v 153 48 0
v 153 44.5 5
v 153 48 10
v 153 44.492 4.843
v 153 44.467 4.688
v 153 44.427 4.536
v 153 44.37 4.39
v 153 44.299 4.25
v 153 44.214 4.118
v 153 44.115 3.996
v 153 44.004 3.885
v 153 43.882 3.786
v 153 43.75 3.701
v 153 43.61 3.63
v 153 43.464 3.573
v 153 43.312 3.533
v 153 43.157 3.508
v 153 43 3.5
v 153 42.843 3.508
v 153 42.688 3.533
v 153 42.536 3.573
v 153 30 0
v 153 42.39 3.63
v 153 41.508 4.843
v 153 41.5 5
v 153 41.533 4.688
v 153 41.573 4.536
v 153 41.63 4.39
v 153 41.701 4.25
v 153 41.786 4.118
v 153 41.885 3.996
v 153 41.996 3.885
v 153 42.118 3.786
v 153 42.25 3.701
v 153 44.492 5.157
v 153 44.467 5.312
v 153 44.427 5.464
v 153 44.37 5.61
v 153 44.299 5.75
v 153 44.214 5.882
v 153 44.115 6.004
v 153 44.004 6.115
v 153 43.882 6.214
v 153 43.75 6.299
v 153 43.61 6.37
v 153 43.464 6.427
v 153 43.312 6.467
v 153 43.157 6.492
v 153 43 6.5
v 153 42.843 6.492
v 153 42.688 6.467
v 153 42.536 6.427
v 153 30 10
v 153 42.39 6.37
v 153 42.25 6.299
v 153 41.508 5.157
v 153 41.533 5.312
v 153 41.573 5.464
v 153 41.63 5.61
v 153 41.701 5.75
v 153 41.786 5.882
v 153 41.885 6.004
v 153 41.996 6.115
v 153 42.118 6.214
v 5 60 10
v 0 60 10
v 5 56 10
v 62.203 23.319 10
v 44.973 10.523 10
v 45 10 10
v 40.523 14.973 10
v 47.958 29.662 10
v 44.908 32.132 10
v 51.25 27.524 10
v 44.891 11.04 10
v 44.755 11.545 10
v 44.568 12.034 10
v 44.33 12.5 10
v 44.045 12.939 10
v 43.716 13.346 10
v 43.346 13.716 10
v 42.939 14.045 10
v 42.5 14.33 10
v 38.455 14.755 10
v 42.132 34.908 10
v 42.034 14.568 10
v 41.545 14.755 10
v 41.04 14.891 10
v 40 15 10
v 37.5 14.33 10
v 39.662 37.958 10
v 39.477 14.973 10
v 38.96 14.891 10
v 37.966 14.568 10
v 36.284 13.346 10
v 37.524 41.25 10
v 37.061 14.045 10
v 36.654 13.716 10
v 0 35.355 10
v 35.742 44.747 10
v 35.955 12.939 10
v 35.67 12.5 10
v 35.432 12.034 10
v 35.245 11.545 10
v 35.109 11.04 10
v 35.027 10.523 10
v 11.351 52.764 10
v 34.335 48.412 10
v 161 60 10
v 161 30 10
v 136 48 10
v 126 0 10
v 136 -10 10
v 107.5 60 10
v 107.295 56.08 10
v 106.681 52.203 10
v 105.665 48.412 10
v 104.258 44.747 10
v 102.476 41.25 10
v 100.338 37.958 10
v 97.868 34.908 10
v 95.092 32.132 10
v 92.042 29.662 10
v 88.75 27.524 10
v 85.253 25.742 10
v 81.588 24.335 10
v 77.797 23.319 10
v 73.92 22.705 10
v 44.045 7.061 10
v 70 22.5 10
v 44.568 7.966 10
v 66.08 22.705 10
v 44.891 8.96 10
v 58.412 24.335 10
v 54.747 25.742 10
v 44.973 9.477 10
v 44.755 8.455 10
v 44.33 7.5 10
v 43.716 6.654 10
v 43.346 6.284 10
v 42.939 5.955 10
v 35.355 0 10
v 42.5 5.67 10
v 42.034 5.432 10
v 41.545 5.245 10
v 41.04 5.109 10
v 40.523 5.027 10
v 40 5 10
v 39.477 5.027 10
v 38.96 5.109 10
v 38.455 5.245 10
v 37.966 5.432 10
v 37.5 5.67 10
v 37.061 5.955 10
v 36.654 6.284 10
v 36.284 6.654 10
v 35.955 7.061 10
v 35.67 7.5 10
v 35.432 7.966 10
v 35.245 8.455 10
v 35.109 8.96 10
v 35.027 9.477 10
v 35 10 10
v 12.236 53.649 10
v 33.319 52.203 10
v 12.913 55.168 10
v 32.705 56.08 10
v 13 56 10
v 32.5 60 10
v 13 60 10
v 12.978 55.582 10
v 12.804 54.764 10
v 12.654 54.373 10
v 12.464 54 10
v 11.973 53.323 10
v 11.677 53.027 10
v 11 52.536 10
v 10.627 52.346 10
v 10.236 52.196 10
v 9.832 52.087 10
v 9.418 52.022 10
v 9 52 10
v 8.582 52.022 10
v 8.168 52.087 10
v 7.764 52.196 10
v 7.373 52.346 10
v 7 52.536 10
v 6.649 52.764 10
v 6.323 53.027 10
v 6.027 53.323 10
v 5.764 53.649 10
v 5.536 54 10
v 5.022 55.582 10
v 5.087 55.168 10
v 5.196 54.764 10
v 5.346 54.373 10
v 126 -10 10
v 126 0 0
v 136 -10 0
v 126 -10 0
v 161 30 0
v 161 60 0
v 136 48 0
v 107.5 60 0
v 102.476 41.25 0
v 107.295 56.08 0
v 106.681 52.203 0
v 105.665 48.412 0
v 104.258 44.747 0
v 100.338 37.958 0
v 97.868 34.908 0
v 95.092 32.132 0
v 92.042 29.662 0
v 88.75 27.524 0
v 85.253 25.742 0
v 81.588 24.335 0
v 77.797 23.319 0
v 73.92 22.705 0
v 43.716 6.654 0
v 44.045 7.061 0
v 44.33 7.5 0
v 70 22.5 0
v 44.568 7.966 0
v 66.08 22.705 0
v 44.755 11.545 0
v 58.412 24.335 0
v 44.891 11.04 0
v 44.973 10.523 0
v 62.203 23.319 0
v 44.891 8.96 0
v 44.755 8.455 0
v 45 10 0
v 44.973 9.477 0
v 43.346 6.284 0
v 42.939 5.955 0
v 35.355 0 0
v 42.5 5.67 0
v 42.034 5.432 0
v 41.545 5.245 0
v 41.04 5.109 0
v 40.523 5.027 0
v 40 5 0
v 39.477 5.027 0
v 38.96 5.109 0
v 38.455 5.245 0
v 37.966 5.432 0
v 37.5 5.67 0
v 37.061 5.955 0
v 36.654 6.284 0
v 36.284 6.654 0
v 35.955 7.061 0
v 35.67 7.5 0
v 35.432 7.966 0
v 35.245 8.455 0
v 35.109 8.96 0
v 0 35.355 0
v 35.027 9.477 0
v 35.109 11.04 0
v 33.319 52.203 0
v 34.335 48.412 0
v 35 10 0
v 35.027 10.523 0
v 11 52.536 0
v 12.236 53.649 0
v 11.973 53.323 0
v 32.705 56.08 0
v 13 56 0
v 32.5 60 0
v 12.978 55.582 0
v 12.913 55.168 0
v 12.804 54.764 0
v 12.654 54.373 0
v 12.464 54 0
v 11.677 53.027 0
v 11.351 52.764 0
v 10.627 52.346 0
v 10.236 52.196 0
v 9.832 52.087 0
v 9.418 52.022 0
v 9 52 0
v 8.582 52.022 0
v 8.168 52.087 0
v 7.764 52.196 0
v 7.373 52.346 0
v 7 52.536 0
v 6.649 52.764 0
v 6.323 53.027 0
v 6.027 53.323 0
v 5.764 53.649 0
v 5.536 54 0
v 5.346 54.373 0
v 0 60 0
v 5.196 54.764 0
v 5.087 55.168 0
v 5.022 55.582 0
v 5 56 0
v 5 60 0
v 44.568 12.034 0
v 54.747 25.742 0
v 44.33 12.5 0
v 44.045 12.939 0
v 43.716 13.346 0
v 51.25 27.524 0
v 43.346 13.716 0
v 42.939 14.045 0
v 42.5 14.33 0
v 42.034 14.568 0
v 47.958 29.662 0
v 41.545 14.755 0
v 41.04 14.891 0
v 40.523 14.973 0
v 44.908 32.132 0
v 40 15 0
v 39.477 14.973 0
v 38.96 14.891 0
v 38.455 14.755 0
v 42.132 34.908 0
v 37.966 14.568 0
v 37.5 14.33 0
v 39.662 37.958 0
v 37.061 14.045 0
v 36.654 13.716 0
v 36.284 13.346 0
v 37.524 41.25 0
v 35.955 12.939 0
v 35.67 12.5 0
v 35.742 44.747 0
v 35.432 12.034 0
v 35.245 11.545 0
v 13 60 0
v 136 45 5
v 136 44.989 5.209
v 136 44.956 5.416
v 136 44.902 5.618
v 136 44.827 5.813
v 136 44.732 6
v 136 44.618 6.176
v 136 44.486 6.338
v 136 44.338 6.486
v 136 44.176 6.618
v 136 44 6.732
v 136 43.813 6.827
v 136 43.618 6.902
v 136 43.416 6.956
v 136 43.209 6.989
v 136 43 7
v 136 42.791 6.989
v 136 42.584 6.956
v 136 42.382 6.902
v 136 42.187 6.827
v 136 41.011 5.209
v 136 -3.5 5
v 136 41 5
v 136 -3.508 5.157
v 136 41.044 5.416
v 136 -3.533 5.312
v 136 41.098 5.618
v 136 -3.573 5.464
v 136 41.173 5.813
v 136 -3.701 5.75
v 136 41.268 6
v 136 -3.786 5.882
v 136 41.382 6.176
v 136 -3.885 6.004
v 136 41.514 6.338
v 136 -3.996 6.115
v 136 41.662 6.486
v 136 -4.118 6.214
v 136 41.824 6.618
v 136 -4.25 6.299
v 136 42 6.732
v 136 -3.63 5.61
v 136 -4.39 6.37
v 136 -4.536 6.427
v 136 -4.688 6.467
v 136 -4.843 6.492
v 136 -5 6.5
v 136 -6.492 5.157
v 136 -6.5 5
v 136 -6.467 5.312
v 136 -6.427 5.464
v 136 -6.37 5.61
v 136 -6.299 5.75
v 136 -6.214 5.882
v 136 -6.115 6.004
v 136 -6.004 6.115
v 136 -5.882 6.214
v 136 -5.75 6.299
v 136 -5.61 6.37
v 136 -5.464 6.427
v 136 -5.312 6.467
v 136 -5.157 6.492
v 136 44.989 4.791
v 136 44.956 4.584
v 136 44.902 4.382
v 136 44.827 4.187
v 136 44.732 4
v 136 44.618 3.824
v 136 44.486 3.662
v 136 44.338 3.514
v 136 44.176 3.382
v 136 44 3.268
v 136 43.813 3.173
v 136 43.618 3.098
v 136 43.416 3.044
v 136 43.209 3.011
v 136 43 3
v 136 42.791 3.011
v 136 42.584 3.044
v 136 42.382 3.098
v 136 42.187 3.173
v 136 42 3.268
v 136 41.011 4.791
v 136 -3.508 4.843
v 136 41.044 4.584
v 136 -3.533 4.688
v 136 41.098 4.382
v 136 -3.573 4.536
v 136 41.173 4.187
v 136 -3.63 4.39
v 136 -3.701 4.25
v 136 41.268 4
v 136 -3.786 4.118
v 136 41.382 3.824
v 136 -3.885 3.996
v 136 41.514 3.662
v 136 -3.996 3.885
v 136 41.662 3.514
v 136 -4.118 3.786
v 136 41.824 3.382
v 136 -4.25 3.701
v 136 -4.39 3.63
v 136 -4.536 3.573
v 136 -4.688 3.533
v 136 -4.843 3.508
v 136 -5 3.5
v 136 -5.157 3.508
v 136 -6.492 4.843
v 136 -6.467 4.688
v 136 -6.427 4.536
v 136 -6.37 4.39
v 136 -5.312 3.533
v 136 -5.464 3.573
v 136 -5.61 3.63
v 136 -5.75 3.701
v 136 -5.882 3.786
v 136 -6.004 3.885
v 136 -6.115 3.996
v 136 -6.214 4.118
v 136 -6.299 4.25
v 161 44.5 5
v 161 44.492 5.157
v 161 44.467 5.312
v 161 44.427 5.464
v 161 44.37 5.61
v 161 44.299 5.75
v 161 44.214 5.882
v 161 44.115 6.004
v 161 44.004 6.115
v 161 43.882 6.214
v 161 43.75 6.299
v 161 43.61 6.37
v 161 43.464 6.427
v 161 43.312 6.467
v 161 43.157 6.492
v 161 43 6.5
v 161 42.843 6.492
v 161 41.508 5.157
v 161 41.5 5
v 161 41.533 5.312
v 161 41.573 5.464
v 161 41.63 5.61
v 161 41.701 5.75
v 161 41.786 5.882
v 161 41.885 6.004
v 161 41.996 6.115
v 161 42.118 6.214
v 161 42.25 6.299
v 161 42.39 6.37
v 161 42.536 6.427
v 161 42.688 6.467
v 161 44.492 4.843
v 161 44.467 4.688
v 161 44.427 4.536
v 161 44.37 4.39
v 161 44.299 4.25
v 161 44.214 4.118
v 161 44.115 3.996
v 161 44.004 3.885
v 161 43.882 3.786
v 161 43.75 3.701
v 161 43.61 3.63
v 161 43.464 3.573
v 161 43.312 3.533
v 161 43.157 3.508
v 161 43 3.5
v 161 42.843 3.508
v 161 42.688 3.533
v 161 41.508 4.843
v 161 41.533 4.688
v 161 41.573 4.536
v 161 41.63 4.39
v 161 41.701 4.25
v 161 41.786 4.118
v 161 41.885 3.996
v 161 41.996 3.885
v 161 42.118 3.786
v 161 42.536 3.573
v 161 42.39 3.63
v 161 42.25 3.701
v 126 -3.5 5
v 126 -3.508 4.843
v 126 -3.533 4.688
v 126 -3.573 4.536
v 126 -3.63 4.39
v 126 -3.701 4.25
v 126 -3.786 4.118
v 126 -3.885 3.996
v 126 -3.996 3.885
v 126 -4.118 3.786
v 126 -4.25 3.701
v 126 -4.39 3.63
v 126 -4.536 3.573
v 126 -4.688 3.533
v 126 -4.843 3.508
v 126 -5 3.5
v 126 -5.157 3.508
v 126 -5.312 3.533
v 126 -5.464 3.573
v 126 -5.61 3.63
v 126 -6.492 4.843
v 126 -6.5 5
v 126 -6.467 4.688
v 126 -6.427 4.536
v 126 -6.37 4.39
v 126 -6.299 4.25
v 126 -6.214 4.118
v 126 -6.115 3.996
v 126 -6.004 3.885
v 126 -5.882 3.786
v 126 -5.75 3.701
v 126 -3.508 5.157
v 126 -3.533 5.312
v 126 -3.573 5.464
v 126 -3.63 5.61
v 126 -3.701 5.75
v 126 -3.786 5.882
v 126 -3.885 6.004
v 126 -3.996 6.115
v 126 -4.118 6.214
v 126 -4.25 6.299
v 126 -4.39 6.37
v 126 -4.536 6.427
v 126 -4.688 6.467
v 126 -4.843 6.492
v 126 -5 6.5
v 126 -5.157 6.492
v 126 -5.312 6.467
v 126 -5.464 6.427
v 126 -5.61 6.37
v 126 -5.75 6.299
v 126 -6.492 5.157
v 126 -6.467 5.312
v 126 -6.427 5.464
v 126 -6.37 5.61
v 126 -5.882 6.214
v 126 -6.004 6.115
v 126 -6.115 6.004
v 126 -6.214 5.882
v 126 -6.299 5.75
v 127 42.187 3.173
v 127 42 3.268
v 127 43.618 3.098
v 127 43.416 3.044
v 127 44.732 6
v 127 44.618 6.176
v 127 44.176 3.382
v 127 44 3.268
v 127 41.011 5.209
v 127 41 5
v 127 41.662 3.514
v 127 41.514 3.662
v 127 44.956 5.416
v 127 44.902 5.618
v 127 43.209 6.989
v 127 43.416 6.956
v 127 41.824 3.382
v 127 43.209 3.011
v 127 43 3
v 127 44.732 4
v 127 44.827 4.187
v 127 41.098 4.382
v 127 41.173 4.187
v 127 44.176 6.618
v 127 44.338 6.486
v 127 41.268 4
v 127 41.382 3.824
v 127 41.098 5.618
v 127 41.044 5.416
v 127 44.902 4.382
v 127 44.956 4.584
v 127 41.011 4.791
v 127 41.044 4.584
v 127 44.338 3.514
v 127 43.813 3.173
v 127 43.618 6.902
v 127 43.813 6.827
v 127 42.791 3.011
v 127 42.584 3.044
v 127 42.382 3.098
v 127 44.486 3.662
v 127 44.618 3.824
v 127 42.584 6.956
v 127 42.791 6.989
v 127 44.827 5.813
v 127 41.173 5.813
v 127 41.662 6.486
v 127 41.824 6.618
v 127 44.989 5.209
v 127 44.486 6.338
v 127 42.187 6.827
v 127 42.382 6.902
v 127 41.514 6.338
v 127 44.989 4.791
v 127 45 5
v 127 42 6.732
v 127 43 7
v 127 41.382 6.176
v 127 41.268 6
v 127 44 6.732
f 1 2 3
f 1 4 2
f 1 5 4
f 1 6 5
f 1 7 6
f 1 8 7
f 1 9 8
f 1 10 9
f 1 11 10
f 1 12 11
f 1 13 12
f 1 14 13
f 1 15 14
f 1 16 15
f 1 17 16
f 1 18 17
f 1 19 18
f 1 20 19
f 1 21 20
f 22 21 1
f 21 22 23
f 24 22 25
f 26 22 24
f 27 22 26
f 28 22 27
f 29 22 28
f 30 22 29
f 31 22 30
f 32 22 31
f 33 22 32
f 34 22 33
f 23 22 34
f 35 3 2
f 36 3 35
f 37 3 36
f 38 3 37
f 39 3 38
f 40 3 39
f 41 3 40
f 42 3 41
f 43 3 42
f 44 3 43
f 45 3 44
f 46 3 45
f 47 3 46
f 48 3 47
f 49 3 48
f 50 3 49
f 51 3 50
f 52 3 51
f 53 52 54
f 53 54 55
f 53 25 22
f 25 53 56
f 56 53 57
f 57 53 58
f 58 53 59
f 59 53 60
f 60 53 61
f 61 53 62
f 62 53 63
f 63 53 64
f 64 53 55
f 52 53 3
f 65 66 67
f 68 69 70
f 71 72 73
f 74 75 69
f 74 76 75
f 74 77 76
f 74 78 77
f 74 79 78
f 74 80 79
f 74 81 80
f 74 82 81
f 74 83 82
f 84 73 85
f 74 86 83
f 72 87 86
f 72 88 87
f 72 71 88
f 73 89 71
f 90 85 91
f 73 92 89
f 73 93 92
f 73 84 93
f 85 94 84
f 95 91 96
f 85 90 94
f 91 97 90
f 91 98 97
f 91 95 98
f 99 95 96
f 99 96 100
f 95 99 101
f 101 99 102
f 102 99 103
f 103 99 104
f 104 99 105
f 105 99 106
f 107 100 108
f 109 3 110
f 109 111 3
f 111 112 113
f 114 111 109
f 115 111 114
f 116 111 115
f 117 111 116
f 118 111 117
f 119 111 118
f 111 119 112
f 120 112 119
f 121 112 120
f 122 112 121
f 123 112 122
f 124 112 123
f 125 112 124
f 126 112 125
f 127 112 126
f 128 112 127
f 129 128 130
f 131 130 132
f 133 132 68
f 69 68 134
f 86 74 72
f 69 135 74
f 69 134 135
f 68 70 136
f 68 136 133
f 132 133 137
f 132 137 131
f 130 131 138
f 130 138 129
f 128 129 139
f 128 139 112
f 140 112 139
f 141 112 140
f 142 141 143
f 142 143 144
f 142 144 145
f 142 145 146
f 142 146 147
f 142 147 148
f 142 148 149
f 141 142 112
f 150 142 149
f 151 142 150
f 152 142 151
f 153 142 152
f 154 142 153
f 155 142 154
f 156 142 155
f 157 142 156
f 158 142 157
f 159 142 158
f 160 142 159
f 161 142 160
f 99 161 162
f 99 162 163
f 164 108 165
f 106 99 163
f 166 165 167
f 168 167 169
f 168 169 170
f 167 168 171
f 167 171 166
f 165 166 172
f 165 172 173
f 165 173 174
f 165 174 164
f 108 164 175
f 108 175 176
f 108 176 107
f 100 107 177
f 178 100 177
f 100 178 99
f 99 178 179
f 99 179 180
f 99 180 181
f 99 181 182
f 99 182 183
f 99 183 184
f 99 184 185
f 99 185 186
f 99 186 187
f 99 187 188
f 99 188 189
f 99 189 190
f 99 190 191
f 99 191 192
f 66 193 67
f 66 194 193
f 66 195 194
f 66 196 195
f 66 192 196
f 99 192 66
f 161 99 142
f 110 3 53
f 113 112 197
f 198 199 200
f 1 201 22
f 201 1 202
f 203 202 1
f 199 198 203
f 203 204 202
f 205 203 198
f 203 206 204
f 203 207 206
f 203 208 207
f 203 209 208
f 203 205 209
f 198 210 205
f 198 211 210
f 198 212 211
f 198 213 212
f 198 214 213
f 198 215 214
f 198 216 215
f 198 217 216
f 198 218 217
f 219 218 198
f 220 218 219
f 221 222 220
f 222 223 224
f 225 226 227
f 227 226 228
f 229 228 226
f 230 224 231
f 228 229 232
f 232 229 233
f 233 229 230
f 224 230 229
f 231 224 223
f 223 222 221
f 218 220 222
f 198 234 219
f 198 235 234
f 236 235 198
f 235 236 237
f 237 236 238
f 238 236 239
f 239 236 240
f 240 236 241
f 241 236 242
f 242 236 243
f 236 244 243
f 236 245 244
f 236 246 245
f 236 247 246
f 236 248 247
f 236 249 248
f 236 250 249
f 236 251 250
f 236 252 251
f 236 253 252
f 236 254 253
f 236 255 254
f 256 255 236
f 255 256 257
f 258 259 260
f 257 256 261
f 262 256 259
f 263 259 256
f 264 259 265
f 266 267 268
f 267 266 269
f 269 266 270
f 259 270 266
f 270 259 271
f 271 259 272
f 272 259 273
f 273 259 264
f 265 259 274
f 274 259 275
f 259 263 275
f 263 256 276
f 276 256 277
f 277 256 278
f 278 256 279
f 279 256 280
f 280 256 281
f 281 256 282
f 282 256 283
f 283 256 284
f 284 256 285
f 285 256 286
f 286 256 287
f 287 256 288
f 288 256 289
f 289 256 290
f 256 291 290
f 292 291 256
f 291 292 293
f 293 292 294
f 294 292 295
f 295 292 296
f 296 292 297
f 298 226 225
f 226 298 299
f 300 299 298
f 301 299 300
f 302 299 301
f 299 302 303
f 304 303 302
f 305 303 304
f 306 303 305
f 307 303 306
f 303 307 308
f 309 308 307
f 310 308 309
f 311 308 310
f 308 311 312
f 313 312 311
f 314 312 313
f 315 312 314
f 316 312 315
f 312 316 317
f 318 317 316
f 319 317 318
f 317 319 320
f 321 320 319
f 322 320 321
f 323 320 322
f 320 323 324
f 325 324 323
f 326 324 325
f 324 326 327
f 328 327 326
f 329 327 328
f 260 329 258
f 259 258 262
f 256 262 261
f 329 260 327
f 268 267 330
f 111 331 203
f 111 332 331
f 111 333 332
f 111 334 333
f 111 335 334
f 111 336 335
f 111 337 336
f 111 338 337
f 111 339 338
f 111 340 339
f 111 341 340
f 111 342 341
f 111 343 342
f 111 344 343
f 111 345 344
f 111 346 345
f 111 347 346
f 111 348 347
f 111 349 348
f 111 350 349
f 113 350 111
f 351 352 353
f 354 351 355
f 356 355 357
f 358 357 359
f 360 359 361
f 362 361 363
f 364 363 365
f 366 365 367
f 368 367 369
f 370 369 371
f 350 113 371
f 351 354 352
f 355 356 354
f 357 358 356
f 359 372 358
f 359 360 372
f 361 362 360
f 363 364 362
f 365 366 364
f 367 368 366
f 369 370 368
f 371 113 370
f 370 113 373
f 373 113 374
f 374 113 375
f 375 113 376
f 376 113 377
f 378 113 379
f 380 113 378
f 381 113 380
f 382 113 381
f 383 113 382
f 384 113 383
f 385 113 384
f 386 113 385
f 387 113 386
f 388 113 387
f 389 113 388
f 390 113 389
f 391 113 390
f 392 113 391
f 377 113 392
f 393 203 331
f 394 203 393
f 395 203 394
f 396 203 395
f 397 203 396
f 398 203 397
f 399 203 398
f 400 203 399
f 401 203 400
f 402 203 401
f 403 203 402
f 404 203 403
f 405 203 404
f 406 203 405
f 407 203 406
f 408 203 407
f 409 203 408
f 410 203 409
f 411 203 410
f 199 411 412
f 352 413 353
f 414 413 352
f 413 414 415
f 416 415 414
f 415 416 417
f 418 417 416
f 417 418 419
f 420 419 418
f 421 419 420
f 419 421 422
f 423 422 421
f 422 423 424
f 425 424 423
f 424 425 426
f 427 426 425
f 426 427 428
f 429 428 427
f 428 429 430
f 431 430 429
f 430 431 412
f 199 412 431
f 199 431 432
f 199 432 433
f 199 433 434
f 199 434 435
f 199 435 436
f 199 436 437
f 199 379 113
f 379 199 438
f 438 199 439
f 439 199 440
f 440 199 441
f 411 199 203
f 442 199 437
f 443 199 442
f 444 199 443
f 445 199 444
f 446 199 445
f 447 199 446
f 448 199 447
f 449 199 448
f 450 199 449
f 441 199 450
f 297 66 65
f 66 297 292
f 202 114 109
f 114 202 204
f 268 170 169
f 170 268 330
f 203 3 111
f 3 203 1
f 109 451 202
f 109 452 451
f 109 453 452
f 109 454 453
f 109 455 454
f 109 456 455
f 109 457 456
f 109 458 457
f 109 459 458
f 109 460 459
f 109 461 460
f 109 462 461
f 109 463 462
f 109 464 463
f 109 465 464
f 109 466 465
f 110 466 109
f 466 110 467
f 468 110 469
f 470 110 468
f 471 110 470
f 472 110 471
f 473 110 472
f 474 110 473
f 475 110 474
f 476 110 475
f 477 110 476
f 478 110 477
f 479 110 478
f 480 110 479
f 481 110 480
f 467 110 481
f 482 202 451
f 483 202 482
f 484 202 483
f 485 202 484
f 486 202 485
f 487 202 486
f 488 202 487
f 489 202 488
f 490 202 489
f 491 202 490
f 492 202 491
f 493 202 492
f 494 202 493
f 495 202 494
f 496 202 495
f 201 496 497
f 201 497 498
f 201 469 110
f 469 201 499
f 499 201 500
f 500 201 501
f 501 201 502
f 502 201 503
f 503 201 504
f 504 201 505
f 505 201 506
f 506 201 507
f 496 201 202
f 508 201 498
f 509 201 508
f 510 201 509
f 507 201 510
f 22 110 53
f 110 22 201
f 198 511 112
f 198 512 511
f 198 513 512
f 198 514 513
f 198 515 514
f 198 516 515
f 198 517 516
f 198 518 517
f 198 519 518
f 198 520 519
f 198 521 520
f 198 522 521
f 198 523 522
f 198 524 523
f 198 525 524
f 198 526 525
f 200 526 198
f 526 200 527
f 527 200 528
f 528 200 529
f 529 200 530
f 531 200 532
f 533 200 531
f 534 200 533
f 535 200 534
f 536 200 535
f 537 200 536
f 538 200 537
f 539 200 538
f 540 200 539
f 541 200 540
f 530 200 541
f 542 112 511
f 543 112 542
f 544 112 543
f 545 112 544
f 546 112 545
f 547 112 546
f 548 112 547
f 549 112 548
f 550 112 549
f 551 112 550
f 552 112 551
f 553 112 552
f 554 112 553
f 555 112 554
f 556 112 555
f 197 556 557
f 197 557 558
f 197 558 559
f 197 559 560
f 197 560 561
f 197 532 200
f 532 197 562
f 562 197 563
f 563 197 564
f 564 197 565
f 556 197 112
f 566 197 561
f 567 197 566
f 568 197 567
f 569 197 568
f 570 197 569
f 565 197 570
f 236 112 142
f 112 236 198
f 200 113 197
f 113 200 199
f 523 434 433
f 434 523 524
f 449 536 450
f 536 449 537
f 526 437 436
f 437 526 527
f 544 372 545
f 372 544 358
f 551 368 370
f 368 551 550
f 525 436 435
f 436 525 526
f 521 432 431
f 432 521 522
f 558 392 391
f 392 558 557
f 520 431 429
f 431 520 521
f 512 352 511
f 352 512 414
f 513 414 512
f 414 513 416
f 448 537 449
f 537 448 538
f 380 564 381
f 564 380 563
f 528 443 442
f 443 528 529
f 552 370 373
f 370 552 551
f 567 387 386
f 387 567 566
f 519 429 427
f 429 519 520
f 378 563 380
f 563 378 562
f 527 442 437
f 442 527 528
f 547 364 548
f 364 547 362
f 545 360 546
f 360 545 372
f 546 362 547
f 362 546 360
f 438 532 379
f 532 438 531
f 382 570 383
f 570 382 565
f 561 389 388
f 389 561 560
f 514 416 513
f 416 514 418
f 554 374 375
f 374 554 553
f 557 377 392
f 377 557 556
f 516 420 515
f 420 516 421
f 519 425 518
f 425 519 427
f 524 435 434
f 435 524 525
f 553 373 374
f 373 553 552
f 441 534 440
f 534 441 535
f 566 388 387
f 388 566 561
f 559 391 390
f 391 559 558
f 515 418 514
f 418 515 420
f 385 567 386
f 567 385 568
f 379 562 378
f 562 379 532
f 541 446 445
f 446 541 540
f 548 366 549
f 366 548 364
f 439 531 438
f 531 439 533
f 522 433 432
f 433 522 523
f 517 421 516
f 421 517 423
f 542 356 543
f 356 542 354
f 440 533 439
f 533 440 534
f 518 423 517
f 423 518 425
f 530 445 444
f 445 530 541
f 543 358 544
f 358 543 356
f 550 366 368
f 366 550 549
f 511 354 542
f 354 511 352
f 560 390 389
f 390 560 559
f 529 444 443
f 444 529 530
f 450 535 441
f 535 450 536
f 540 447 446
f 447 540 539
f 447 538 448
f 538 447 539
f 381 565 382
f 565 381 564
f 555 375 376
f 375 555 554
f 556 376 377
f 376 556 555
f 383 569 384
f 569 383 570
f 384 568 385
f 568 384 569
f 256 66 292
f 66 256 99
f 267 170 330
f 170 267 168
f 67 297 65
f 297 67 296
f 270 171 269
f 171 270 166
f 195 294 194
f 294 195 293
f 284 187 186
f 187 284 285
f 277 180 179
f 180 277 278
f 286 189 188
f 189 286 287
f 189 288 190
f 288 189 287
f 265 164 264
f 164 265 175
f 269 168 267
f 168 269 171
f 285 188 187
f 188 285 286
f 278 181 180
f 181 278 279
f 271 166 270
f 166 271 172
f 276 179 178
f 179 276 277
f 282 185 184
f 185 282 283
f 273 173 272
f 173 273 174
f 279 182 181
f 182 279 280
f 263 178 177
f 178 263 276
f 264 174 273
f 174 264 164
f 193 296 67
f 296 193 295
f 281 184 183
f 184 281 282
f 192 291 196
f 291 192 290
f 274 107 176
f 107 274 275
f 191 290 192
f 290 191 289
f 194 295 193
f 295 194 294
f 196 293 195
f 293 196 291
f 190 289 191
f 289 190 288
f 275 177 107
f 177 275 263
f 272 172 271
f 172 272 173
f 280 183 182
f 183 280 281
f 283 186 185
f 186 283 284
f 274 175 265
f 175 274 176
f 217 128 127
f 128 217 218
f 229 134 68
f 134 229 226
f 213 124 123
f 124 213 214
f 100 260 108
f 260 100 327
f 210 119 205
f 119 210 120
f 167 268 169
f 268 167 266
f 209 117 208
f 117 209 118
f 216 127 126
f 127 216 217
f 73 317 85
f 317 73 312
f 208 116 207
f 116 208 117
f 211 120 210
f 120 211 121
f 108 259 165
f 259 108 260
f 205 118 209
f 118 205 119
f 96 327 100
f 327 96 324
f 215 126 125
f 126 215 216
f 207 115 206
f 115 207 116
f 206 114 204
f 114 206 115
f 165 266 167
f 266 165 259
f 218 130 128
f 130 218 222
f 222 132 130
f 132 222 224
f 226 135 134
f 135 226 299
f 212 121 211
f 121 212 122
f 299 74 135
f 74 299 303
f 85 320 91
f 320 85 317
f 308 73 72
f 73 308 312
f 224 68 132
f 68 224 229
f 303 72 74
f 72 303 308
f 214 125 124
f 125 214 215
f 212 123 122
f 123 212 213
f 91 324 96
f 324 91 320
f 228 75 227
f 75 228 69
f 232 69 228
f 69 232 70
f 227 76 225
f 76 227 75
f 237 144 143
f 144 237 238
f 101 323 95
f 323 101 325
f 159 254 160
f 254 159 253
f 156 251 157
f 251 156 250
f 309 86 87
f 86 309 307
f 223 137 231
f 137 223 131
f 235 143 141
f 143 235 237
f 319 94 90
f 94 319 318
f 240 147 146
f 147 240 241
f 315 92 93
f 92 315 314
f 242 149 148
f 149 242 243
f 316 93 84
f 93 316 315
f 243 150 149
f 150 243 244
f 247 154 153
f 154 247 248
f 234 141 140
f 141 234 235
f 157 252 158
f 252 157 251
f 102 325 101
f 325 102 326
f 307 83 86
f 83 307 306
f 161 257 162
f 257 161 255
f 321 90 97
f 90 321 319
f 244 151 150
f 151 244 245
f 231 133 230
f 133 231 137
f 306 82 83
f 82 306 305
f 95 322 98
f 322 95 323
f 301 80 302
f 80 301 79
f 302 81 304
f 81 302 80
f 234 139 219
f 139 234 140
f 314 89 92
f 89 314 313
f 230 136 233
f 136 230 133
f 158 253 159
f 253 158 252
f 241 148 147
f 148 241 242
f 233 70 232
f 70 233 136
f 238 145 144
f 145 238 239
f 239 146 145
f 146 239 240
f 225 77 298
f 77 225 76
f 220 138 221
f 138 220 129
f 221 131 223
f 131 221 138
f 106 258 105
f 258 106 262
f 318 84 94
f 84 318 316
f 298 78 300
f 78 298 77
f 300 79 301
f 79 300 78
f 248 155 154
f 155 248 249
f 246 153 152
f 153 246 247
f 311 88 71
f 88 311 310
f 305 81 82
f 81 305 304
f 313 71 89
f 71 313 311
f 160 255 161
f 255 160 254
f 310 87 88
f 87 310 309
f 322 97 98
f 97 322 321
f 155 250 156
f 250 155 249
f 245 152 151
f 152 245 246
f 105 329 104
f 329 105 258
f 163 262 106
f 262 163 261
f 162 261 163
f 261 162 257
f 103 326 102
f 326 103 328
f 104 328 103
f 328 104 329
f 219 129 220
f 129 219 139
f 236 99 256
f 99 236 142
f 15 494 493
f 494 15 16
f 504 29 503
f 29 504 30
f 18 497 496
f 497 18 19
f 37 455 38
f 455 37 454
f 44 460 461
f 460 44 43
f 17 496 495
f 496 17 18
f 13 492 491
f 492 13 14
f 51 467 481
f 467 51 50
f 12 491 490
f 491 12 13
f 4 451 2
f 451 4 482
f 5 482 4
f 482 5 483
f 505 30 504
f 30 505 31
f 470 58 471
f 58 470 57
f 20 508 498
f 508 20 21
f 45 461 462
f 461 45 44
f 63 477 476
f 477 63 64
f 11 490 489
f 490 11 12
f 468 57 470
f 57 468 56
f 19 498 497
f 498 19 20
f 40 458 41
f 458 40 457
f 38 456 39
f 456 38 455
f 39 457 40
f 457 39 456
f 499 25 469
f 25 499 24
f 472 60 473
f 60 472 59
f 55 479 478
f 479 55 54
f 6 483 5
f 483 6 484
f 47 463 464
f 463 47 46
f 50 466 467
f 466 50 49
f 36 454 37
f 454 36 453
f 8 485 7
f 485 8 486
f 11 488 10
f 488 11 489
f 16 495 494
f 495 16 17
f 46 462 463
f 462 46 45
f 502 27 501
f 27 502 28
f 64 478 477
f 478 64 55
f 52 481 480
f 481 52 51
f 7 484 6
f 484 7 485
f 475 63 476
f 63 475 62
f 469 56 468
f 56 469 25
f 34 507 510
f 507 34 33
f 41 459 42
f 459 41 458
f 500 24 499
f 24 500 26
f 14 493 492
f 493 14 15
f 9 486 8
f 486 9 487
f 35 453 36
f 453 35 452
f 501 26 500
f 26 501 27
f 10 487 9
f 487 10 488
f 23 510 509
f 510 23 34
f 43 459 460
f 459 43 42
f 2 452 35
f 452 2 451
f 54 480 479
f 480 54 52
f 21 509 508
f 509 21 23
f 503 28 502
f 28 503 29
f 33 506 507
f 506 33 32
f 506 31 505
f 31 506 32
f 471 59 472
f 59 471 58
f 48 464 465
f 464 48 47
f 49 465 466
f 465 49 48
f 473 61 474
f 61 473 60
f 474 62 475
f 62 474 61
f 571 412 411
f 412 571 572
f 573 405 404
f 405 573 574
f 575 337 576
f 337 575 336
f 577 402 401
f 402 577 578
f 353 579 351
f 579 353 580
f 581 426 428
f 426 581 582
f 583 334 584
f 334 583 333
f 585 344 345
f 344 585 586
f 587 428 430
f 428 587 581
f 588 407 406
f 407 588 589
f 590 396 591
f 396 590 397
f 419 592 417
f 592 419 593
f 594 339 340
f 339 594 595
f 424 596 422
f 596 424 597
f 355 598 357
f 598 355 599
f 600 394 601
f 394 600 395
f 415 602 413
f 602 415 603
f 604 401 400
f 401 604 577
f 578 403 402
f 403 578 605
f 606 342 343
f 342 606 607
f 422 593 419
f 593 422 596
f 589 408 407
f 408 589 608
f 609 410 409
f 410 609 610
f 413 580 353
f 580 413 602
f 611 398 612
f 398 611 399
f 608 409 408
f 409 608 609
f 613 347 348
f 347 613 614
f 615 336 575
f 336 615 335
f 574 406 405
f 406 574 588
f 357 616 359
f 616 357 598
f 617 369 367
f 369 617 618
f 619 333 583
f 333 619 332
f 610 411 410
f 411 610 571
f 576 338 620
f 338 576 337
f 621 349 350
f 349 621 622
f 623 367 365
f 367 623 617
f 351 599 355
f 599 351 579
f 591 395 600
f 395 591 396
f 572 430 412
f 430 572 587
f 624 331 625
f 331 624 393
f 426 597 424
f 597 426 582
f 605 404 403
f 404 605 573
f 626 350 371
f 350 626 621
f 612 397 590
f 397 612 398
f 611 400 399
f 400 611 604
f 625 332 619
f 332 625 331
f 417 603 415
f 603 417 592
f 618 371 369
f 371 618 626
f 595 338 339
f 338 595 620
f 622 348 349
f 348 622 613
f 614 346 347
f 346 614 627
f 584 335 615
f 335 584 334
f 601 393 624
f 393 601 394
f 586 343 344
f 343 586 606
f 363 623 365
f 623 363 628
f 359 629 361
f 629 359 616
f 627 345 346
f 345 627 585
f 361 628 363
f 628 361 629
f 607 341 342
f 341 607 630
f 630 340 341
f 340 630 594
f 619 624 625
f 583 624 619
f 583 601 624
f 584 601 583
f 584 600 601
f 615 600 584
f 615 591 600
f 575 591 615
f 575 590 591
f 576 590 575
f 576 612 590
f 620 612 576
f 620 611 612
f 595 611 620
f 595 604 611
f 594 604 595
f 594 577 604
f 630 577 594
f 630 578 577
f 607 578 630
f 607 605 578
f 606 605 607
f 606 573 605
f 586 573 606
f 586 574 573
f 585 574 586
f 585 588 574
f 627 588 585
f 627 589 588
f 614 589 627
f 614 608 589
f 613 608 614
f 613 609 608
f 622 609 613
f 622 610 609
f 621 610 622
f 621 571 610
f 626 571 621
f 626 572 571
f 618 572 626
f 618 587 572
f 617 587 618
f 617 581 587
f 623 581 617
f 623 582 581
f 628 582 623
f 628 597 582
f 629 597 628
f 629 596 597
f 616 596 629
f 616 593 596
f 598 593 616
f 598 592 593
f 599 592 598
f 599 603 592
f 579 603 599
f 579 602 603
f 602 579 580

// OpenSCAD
// CSG.scad - Basic example of CSG usage


$fn=60;
thickness=10;
frame_thickness=17;
hook_length=30;
hook_height=12;
hook_thickness=8;
hook_hole_depth=10;
hook_hole_diameter=3;
hook_hole_body_diameter=4;
rod_diameter=8;
foot_size=10;
foot_hole_diameter=3;
cable_hole_diameter=10;



difference() {

    union() {
        // Main body
        cube([136, 60, thickness]);
        
        // Hook
        translate([136, 60-hook_height, 0]) {
            cube([frame_thickness, hook_height, thickness]);
            
            translate([frame_thickness, -(hook_length-hook_height), 0]) {
                cube([hook_thickness, hook_length, thickness]);
            }
        }
        
        // Foot
        translate([136-foot_size, -(20-foot_size), 0]) {
            difference() {
                cube([foot_size, foot_size, thickness]);
                
                // Screw hole
                translate([-foot_size/2, foot_size/2, thickness/2]) {
                    rotate([0, 90, 0]) { 
                        cylinder(h=foot_size*2, r=foot_hole_diameter/2);
                    }
                }
            }
        
        }
    }

    // Big hole
    translate([70, 60, thickness/2]) {
       cylinder(h=thickness*2, r=75/2, center=true);
    }


    // Rod hole
    translate([rod_diameter/2 + 5, 60-rod_diameter/2, thickness/2]) {
        translate([-rod_diameter/2, 0, -thickness]) {
            cube([rod_diameter, rod_diameter*2, thickness*2]);
        }
        cylinder(h=thickness*2, r=rod_diameter/2, center=true);
    }
    

    // Cable hole
    translate([40, 10, thickness/2]) {
        cylinder(h=thickness*2, r=cable_hole_diameter/2, center=true);
    }


    // Cutoff
    rotate([0, 0, 45]) {
        translate([0, 0, thickness/2]) {
        cube([50, 50, thickness*2], center=true);
        }
    }
    
    
    // Hook hole
    translate([137, 70 - hook_height - (hook_length/2), thickness/2]) {
        rotate([0,90,0]) {
            cylinder(h=500, r=hook_hole_diameter/2);
        }
    }    

    // Body hole
    translate([137 - hook_hole_depth, 70 - hook_height - (hook_length/2), thickness/2]) {
        rotate([0,90,0]) {
            cylinder(h=hook_hole_depth+1, r=hook_hole_body_diameter/2);
        }
    }        
}




echo(version=version());
// Written by Marius Kintel <marius@kintel.n6et>
//
// To the extent possible under law, the author(s) have dedicated all
// copyright and related and neighboring rights to this software to the
// public domain worldwide. This software is distributed without any
// warranty.
//
// You should have received a copy of the CC0 Public Domain
// Dedication along with this software.
// If not, see <http://creativecommons.org/publicdomain/zero/1.0/>.
